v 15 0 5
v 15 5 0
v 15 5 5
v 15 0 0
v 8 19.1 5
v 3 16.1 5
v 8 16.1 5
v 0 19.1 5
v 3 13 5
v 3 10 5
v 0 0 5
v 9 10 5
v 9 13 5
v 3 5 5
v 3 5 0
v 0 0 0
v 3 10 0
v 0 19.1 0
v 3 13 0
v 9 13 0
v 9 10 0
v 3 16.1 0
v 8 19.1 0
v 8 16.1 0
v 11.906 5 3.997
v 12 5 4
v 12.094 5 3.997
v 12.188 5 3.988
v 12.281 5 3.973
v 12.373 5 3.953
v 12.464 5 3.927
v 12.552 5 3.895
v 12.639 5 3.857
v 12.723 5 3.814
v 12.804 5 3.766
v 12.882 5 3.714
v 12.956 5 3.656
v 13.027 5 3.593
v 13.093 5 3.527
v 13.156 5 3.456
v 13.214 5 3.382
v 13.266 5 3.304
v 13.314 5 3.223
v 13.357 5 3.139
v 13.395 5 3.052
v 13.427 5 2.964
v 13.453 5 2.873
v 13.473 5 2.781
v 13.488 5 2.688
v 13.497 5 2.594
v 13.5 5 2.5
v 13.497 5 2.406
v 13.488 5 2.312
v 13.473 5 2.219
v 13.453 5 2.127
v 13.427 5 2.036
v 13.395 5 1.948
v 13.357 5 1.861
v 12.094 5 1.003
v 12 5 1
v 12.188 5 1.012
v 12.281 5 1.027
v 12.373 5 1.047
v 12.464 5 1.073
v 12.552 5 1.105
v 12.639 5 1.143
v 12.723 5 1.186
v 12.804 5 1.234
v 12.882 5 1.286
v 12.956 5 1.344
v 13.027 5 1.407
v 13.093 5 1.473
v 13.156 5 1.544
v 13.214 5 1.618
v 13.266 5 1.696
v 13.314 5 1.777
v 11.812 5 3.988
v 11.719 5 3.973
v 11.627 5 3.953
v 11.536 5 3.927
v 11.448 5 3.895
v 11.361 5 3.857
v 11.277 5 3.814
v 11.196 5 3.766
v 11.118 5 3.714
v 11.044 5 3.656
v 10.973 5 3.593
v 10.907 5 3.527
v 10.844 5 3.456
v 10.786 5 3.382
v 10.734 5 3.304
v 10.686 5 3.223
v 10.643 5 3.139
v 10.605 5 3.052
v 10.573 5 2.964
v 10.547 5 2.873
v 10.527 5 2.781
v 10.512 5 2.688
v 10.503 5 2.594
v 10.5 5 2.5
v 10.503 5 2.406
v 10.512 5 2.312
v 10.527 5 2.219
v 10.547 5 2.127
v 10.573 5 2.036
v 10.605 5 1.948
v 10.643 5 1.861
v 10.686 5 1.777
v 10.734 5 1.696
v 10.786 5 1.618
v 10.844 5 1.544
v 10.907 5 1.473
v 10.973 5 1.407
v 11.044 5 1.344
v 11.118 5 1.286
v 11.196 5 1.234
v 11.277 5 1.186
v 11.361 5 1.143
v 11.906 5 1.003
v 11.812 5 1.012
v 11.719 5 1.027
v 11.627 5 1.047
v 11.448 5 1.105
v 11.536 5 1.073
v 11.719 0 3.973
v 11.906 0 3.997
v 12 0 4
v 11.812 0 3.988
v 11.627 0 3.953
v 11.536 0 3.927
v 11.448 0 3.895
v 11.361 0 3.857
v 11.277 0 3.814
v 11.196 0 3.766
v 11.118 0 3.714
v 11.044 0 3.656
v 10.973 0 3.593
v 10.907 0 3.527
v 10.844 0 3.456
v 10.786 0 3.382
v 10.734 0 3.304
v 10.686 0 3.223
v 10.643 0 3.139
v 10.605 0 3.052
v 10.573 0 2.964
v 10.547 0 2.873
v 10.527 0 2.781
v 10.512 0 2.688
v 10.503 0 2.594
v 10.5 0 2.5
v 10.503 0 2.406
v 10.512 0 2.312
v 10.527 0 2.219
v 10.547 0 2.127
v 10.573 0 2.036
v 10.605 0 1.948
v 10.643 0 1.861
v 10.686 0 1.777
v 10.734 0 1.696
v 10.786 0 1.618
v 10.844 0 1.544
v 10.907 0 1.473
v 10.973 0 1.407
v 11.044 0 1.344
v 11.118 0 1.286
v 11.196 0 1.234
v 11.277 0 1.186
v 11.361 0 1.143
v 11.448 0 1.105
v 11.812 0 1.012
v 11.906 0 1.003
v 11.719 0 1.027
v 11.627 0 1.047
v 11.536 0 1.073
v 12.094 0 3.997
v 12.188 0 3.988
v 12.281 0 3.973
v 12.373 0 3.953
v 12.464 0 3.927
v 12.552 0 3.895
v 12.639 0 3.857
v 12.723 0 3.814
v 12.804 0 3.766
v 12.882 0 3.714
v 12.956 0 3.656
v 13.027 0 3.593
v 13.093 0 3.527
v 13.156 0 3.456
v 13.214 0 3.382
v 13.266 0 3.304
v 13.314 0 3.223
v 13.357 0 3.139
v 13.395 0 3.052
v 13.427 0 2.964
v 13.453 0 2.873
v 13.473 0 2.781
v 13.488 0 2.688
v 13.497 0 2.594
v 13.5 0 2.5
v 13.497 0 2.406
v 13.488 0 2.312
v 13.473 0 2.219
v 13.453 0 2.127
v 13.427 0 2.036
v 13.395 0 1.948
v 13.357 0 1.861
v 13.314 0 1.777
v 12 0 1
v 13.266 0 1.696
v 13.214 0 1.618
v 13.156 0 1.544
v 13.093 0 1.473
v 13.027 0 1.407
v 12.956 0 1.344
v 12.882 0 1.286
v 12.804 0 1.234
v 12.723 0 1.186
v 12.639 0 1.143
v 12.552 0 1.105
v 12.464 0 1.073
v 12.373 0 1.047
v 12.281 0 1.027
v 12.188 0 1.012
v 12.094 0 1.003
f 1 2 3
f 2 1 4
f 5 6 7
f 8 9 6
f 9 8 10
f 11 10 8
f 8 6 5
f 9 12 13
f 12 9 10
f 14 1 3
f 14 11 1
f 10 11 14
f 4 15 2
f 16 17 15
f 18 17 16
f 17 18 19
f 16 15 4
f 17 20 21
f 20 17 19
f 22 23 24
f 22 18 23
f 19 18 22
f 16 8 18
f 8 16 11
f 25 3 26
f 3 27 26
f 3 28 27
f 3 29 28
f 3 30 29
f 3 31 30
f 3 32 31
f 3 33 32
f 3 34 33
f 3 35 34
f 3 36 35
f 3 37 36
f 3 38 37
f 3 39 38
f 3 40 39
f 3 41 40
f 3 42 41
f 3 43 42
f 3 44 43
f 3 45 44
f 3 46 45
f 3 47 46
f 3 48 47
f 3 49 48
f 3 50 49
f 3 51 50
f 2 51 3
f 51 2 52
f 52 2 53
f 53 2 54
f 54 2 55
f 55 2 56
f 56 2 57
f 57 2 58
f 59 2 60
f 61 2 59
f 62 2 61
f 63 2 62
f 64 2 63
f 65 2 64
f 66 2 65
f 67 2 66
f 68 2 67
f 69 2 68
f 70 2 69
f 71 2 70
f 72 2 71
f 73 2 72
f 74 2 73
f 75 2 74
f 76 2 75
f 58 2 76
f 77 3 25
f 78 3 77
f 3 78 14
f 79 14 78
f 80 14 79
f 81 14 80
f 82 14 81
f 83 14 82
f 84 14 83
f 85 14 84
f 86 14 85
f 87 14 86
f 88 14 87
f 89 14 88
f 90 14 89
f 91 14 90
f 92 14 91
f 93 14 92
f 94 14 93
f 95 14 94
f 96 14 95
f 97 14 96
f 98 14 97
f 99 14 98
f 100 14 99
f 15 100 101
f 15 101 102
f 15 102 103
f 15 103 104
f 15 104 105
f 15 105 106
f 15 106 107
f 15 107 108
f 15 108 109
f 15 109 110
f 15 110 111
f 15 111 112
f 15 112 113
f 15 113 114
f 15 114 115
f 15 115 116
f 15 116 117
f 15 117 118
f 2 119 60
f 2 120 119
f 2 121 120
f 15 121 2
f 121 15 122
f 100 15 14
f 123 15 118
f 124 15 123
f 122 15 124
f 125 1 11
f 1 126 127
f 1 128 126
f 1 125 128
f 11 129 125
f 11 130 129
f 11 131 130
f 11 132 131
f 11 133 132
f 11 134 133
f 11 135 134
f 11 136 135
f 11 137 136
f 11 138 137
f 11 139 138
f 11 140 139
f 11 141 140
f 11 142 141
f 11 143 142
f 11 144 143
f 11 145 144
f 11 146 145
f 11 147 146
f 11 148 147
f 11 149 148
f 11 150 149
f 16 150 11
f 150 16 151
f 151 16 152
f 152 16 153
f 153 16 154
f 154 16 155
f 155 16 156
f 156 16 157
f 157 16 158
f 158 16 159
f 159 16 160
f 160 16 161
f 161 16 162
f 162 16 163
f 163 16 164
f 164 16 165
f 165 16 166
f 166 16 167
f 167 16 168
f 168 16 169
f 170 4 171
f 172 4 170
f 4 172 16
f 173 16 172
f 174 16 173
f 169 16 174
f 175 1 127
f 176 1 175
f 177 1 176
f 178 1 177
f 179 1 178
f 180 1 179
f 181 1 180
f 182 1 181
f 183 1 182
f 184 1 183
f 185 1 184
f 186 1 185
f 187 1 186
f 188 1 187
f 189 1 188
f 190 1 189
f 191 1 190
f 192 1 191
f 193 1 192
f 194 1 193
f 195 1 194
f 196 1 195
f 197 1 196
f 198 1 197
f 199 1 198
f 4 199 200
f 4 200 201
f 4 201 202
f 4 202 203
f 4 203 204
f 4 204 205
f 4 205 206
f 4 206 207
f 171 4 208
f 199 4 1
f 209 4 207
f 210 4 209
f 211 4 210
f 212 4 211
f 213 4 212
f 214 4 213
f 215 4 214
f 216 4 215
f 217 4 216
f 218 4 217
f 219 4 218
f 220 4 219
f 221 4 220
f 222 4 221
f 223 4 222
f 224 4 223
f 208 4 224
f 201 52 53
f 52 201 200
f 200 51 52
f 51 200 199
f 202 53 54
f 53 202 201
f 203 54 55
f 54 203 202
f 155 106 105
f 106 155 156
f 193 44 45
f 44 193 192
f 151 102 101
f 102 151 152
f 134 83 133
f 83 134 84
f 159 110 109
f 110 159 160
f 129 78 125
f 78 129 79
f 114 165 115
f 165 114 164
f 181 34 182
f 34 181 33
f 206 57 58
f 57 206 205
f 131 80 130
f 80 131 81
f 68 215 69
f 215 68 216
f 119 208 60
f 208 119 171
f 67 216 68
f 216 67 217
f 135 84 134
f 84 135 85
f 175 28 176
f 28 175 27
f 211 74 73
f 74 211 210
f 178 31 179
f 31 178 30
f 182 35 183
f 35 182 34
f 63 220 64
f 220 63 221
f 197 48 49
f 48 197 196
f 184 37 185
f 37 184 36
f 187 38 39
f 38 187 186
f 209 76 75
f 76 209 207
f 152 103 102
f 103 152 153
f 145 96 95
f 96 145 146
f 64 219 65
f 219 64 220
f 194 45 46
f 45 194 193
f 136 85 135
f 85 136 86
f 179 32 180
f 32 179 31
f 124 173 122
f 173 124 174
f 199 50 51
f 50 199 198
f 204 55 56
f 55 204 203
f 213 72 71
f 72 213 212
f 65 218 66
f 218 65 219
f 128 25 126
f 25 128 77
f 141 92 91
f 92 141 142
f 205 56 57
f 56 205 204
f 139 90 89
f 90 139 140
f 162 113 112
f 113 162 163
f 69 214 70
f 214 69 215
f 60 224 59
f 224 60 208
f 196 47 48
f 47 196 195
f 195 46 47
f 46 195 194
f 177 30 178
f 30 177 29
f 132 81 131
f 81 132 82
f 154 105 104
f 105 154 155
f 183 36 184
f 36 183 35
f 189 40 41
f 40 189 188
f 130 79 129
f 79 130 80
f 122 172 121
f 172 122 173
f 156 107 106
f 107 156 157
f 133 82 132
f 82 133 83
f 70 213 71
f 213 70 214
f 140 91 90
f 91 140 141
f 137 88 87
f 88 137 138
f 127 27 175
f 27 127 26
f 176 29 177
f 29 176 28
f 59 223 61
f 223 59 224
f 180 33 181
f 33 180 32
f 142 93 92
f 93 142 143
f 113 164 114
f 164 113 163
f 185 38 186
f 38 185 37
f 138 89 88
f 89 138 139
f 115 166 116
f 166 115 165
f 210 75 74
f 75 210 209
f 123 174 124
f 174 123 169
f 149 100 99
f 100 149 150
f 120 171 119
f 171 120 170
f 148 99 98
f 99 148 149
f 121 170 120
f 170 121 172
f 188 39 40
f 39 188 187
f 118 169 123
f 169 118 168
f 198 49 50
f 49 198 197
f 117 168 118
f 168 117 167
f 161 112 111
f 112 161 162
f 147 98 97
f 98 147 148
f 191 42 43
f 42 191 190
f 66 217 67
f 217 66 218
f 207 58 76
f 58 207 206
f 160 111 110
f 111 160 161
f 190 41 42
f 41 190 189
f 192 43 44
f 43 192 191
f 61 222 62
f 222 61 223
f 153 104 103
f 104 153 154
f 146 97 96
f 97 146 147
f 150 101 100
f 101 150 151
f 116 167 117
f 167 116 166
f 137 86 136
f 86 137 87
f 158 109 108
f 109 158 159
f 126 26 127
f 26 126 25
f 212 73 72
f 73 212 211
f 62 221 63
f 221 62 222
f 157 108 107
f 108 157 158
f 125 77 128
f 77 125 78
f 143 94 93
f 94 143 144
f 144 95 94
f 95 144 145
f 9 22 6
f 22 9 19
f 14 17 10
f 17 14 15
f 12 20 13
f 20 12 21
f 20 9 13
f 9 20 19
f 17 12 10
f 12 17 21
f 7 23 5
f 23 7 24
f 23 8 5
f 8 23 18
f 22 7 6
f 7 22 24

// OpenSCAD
/*
Solar holder
Used with flat surface to mount chip solar panels (11x6)
*/


/* [Main Settings] */
//Holder thickness (Z)
holder_thicknes=5;

//Holder width
holder_height=3;

//Holder dimention near mounting surface
sufrace_width=15;
sufrace_height=5;

//Solar mount part height (from surface)
solar_mount_part_height=10;
// Solar thickness
solar_thickness=3.1;

//Solar top and bottom holder width
solar_bottom_holder_width=6;
solar_top_holder_width=5;

module surface_part()
{
    screw_diameter=3;
    $fn=100;
    
    difference()
    {
        cube([sufrace_width,sufrace_height,holder_thicknes]);
        //screw hole
        translate([sufrace_width*0.8,0,holder_thicknes/2])rotate([-90,0,0])cylinder(holder_thicknes,screw_diameter/2,screw_diameter/2);
        
    }
}



module main()
{
    surface_part();
    
    cube([holder_height,get_total_height(),holder_thicknes]);
    
    translate([0,solar_mount_part_height,0])cube([holder_height+solar_bottom_holder_width,holder_height,holder_thicknes]);
    
    translate([0,solar_mount_part_height+solar_thickness+holder_height,0])cube([holder_height+solar_top_holder_width,holder_height,holder_thicknes]);
    
}

main();

function get_total_height()=solar_mount_part_height+holder_thicknes+solar_thickness;  
